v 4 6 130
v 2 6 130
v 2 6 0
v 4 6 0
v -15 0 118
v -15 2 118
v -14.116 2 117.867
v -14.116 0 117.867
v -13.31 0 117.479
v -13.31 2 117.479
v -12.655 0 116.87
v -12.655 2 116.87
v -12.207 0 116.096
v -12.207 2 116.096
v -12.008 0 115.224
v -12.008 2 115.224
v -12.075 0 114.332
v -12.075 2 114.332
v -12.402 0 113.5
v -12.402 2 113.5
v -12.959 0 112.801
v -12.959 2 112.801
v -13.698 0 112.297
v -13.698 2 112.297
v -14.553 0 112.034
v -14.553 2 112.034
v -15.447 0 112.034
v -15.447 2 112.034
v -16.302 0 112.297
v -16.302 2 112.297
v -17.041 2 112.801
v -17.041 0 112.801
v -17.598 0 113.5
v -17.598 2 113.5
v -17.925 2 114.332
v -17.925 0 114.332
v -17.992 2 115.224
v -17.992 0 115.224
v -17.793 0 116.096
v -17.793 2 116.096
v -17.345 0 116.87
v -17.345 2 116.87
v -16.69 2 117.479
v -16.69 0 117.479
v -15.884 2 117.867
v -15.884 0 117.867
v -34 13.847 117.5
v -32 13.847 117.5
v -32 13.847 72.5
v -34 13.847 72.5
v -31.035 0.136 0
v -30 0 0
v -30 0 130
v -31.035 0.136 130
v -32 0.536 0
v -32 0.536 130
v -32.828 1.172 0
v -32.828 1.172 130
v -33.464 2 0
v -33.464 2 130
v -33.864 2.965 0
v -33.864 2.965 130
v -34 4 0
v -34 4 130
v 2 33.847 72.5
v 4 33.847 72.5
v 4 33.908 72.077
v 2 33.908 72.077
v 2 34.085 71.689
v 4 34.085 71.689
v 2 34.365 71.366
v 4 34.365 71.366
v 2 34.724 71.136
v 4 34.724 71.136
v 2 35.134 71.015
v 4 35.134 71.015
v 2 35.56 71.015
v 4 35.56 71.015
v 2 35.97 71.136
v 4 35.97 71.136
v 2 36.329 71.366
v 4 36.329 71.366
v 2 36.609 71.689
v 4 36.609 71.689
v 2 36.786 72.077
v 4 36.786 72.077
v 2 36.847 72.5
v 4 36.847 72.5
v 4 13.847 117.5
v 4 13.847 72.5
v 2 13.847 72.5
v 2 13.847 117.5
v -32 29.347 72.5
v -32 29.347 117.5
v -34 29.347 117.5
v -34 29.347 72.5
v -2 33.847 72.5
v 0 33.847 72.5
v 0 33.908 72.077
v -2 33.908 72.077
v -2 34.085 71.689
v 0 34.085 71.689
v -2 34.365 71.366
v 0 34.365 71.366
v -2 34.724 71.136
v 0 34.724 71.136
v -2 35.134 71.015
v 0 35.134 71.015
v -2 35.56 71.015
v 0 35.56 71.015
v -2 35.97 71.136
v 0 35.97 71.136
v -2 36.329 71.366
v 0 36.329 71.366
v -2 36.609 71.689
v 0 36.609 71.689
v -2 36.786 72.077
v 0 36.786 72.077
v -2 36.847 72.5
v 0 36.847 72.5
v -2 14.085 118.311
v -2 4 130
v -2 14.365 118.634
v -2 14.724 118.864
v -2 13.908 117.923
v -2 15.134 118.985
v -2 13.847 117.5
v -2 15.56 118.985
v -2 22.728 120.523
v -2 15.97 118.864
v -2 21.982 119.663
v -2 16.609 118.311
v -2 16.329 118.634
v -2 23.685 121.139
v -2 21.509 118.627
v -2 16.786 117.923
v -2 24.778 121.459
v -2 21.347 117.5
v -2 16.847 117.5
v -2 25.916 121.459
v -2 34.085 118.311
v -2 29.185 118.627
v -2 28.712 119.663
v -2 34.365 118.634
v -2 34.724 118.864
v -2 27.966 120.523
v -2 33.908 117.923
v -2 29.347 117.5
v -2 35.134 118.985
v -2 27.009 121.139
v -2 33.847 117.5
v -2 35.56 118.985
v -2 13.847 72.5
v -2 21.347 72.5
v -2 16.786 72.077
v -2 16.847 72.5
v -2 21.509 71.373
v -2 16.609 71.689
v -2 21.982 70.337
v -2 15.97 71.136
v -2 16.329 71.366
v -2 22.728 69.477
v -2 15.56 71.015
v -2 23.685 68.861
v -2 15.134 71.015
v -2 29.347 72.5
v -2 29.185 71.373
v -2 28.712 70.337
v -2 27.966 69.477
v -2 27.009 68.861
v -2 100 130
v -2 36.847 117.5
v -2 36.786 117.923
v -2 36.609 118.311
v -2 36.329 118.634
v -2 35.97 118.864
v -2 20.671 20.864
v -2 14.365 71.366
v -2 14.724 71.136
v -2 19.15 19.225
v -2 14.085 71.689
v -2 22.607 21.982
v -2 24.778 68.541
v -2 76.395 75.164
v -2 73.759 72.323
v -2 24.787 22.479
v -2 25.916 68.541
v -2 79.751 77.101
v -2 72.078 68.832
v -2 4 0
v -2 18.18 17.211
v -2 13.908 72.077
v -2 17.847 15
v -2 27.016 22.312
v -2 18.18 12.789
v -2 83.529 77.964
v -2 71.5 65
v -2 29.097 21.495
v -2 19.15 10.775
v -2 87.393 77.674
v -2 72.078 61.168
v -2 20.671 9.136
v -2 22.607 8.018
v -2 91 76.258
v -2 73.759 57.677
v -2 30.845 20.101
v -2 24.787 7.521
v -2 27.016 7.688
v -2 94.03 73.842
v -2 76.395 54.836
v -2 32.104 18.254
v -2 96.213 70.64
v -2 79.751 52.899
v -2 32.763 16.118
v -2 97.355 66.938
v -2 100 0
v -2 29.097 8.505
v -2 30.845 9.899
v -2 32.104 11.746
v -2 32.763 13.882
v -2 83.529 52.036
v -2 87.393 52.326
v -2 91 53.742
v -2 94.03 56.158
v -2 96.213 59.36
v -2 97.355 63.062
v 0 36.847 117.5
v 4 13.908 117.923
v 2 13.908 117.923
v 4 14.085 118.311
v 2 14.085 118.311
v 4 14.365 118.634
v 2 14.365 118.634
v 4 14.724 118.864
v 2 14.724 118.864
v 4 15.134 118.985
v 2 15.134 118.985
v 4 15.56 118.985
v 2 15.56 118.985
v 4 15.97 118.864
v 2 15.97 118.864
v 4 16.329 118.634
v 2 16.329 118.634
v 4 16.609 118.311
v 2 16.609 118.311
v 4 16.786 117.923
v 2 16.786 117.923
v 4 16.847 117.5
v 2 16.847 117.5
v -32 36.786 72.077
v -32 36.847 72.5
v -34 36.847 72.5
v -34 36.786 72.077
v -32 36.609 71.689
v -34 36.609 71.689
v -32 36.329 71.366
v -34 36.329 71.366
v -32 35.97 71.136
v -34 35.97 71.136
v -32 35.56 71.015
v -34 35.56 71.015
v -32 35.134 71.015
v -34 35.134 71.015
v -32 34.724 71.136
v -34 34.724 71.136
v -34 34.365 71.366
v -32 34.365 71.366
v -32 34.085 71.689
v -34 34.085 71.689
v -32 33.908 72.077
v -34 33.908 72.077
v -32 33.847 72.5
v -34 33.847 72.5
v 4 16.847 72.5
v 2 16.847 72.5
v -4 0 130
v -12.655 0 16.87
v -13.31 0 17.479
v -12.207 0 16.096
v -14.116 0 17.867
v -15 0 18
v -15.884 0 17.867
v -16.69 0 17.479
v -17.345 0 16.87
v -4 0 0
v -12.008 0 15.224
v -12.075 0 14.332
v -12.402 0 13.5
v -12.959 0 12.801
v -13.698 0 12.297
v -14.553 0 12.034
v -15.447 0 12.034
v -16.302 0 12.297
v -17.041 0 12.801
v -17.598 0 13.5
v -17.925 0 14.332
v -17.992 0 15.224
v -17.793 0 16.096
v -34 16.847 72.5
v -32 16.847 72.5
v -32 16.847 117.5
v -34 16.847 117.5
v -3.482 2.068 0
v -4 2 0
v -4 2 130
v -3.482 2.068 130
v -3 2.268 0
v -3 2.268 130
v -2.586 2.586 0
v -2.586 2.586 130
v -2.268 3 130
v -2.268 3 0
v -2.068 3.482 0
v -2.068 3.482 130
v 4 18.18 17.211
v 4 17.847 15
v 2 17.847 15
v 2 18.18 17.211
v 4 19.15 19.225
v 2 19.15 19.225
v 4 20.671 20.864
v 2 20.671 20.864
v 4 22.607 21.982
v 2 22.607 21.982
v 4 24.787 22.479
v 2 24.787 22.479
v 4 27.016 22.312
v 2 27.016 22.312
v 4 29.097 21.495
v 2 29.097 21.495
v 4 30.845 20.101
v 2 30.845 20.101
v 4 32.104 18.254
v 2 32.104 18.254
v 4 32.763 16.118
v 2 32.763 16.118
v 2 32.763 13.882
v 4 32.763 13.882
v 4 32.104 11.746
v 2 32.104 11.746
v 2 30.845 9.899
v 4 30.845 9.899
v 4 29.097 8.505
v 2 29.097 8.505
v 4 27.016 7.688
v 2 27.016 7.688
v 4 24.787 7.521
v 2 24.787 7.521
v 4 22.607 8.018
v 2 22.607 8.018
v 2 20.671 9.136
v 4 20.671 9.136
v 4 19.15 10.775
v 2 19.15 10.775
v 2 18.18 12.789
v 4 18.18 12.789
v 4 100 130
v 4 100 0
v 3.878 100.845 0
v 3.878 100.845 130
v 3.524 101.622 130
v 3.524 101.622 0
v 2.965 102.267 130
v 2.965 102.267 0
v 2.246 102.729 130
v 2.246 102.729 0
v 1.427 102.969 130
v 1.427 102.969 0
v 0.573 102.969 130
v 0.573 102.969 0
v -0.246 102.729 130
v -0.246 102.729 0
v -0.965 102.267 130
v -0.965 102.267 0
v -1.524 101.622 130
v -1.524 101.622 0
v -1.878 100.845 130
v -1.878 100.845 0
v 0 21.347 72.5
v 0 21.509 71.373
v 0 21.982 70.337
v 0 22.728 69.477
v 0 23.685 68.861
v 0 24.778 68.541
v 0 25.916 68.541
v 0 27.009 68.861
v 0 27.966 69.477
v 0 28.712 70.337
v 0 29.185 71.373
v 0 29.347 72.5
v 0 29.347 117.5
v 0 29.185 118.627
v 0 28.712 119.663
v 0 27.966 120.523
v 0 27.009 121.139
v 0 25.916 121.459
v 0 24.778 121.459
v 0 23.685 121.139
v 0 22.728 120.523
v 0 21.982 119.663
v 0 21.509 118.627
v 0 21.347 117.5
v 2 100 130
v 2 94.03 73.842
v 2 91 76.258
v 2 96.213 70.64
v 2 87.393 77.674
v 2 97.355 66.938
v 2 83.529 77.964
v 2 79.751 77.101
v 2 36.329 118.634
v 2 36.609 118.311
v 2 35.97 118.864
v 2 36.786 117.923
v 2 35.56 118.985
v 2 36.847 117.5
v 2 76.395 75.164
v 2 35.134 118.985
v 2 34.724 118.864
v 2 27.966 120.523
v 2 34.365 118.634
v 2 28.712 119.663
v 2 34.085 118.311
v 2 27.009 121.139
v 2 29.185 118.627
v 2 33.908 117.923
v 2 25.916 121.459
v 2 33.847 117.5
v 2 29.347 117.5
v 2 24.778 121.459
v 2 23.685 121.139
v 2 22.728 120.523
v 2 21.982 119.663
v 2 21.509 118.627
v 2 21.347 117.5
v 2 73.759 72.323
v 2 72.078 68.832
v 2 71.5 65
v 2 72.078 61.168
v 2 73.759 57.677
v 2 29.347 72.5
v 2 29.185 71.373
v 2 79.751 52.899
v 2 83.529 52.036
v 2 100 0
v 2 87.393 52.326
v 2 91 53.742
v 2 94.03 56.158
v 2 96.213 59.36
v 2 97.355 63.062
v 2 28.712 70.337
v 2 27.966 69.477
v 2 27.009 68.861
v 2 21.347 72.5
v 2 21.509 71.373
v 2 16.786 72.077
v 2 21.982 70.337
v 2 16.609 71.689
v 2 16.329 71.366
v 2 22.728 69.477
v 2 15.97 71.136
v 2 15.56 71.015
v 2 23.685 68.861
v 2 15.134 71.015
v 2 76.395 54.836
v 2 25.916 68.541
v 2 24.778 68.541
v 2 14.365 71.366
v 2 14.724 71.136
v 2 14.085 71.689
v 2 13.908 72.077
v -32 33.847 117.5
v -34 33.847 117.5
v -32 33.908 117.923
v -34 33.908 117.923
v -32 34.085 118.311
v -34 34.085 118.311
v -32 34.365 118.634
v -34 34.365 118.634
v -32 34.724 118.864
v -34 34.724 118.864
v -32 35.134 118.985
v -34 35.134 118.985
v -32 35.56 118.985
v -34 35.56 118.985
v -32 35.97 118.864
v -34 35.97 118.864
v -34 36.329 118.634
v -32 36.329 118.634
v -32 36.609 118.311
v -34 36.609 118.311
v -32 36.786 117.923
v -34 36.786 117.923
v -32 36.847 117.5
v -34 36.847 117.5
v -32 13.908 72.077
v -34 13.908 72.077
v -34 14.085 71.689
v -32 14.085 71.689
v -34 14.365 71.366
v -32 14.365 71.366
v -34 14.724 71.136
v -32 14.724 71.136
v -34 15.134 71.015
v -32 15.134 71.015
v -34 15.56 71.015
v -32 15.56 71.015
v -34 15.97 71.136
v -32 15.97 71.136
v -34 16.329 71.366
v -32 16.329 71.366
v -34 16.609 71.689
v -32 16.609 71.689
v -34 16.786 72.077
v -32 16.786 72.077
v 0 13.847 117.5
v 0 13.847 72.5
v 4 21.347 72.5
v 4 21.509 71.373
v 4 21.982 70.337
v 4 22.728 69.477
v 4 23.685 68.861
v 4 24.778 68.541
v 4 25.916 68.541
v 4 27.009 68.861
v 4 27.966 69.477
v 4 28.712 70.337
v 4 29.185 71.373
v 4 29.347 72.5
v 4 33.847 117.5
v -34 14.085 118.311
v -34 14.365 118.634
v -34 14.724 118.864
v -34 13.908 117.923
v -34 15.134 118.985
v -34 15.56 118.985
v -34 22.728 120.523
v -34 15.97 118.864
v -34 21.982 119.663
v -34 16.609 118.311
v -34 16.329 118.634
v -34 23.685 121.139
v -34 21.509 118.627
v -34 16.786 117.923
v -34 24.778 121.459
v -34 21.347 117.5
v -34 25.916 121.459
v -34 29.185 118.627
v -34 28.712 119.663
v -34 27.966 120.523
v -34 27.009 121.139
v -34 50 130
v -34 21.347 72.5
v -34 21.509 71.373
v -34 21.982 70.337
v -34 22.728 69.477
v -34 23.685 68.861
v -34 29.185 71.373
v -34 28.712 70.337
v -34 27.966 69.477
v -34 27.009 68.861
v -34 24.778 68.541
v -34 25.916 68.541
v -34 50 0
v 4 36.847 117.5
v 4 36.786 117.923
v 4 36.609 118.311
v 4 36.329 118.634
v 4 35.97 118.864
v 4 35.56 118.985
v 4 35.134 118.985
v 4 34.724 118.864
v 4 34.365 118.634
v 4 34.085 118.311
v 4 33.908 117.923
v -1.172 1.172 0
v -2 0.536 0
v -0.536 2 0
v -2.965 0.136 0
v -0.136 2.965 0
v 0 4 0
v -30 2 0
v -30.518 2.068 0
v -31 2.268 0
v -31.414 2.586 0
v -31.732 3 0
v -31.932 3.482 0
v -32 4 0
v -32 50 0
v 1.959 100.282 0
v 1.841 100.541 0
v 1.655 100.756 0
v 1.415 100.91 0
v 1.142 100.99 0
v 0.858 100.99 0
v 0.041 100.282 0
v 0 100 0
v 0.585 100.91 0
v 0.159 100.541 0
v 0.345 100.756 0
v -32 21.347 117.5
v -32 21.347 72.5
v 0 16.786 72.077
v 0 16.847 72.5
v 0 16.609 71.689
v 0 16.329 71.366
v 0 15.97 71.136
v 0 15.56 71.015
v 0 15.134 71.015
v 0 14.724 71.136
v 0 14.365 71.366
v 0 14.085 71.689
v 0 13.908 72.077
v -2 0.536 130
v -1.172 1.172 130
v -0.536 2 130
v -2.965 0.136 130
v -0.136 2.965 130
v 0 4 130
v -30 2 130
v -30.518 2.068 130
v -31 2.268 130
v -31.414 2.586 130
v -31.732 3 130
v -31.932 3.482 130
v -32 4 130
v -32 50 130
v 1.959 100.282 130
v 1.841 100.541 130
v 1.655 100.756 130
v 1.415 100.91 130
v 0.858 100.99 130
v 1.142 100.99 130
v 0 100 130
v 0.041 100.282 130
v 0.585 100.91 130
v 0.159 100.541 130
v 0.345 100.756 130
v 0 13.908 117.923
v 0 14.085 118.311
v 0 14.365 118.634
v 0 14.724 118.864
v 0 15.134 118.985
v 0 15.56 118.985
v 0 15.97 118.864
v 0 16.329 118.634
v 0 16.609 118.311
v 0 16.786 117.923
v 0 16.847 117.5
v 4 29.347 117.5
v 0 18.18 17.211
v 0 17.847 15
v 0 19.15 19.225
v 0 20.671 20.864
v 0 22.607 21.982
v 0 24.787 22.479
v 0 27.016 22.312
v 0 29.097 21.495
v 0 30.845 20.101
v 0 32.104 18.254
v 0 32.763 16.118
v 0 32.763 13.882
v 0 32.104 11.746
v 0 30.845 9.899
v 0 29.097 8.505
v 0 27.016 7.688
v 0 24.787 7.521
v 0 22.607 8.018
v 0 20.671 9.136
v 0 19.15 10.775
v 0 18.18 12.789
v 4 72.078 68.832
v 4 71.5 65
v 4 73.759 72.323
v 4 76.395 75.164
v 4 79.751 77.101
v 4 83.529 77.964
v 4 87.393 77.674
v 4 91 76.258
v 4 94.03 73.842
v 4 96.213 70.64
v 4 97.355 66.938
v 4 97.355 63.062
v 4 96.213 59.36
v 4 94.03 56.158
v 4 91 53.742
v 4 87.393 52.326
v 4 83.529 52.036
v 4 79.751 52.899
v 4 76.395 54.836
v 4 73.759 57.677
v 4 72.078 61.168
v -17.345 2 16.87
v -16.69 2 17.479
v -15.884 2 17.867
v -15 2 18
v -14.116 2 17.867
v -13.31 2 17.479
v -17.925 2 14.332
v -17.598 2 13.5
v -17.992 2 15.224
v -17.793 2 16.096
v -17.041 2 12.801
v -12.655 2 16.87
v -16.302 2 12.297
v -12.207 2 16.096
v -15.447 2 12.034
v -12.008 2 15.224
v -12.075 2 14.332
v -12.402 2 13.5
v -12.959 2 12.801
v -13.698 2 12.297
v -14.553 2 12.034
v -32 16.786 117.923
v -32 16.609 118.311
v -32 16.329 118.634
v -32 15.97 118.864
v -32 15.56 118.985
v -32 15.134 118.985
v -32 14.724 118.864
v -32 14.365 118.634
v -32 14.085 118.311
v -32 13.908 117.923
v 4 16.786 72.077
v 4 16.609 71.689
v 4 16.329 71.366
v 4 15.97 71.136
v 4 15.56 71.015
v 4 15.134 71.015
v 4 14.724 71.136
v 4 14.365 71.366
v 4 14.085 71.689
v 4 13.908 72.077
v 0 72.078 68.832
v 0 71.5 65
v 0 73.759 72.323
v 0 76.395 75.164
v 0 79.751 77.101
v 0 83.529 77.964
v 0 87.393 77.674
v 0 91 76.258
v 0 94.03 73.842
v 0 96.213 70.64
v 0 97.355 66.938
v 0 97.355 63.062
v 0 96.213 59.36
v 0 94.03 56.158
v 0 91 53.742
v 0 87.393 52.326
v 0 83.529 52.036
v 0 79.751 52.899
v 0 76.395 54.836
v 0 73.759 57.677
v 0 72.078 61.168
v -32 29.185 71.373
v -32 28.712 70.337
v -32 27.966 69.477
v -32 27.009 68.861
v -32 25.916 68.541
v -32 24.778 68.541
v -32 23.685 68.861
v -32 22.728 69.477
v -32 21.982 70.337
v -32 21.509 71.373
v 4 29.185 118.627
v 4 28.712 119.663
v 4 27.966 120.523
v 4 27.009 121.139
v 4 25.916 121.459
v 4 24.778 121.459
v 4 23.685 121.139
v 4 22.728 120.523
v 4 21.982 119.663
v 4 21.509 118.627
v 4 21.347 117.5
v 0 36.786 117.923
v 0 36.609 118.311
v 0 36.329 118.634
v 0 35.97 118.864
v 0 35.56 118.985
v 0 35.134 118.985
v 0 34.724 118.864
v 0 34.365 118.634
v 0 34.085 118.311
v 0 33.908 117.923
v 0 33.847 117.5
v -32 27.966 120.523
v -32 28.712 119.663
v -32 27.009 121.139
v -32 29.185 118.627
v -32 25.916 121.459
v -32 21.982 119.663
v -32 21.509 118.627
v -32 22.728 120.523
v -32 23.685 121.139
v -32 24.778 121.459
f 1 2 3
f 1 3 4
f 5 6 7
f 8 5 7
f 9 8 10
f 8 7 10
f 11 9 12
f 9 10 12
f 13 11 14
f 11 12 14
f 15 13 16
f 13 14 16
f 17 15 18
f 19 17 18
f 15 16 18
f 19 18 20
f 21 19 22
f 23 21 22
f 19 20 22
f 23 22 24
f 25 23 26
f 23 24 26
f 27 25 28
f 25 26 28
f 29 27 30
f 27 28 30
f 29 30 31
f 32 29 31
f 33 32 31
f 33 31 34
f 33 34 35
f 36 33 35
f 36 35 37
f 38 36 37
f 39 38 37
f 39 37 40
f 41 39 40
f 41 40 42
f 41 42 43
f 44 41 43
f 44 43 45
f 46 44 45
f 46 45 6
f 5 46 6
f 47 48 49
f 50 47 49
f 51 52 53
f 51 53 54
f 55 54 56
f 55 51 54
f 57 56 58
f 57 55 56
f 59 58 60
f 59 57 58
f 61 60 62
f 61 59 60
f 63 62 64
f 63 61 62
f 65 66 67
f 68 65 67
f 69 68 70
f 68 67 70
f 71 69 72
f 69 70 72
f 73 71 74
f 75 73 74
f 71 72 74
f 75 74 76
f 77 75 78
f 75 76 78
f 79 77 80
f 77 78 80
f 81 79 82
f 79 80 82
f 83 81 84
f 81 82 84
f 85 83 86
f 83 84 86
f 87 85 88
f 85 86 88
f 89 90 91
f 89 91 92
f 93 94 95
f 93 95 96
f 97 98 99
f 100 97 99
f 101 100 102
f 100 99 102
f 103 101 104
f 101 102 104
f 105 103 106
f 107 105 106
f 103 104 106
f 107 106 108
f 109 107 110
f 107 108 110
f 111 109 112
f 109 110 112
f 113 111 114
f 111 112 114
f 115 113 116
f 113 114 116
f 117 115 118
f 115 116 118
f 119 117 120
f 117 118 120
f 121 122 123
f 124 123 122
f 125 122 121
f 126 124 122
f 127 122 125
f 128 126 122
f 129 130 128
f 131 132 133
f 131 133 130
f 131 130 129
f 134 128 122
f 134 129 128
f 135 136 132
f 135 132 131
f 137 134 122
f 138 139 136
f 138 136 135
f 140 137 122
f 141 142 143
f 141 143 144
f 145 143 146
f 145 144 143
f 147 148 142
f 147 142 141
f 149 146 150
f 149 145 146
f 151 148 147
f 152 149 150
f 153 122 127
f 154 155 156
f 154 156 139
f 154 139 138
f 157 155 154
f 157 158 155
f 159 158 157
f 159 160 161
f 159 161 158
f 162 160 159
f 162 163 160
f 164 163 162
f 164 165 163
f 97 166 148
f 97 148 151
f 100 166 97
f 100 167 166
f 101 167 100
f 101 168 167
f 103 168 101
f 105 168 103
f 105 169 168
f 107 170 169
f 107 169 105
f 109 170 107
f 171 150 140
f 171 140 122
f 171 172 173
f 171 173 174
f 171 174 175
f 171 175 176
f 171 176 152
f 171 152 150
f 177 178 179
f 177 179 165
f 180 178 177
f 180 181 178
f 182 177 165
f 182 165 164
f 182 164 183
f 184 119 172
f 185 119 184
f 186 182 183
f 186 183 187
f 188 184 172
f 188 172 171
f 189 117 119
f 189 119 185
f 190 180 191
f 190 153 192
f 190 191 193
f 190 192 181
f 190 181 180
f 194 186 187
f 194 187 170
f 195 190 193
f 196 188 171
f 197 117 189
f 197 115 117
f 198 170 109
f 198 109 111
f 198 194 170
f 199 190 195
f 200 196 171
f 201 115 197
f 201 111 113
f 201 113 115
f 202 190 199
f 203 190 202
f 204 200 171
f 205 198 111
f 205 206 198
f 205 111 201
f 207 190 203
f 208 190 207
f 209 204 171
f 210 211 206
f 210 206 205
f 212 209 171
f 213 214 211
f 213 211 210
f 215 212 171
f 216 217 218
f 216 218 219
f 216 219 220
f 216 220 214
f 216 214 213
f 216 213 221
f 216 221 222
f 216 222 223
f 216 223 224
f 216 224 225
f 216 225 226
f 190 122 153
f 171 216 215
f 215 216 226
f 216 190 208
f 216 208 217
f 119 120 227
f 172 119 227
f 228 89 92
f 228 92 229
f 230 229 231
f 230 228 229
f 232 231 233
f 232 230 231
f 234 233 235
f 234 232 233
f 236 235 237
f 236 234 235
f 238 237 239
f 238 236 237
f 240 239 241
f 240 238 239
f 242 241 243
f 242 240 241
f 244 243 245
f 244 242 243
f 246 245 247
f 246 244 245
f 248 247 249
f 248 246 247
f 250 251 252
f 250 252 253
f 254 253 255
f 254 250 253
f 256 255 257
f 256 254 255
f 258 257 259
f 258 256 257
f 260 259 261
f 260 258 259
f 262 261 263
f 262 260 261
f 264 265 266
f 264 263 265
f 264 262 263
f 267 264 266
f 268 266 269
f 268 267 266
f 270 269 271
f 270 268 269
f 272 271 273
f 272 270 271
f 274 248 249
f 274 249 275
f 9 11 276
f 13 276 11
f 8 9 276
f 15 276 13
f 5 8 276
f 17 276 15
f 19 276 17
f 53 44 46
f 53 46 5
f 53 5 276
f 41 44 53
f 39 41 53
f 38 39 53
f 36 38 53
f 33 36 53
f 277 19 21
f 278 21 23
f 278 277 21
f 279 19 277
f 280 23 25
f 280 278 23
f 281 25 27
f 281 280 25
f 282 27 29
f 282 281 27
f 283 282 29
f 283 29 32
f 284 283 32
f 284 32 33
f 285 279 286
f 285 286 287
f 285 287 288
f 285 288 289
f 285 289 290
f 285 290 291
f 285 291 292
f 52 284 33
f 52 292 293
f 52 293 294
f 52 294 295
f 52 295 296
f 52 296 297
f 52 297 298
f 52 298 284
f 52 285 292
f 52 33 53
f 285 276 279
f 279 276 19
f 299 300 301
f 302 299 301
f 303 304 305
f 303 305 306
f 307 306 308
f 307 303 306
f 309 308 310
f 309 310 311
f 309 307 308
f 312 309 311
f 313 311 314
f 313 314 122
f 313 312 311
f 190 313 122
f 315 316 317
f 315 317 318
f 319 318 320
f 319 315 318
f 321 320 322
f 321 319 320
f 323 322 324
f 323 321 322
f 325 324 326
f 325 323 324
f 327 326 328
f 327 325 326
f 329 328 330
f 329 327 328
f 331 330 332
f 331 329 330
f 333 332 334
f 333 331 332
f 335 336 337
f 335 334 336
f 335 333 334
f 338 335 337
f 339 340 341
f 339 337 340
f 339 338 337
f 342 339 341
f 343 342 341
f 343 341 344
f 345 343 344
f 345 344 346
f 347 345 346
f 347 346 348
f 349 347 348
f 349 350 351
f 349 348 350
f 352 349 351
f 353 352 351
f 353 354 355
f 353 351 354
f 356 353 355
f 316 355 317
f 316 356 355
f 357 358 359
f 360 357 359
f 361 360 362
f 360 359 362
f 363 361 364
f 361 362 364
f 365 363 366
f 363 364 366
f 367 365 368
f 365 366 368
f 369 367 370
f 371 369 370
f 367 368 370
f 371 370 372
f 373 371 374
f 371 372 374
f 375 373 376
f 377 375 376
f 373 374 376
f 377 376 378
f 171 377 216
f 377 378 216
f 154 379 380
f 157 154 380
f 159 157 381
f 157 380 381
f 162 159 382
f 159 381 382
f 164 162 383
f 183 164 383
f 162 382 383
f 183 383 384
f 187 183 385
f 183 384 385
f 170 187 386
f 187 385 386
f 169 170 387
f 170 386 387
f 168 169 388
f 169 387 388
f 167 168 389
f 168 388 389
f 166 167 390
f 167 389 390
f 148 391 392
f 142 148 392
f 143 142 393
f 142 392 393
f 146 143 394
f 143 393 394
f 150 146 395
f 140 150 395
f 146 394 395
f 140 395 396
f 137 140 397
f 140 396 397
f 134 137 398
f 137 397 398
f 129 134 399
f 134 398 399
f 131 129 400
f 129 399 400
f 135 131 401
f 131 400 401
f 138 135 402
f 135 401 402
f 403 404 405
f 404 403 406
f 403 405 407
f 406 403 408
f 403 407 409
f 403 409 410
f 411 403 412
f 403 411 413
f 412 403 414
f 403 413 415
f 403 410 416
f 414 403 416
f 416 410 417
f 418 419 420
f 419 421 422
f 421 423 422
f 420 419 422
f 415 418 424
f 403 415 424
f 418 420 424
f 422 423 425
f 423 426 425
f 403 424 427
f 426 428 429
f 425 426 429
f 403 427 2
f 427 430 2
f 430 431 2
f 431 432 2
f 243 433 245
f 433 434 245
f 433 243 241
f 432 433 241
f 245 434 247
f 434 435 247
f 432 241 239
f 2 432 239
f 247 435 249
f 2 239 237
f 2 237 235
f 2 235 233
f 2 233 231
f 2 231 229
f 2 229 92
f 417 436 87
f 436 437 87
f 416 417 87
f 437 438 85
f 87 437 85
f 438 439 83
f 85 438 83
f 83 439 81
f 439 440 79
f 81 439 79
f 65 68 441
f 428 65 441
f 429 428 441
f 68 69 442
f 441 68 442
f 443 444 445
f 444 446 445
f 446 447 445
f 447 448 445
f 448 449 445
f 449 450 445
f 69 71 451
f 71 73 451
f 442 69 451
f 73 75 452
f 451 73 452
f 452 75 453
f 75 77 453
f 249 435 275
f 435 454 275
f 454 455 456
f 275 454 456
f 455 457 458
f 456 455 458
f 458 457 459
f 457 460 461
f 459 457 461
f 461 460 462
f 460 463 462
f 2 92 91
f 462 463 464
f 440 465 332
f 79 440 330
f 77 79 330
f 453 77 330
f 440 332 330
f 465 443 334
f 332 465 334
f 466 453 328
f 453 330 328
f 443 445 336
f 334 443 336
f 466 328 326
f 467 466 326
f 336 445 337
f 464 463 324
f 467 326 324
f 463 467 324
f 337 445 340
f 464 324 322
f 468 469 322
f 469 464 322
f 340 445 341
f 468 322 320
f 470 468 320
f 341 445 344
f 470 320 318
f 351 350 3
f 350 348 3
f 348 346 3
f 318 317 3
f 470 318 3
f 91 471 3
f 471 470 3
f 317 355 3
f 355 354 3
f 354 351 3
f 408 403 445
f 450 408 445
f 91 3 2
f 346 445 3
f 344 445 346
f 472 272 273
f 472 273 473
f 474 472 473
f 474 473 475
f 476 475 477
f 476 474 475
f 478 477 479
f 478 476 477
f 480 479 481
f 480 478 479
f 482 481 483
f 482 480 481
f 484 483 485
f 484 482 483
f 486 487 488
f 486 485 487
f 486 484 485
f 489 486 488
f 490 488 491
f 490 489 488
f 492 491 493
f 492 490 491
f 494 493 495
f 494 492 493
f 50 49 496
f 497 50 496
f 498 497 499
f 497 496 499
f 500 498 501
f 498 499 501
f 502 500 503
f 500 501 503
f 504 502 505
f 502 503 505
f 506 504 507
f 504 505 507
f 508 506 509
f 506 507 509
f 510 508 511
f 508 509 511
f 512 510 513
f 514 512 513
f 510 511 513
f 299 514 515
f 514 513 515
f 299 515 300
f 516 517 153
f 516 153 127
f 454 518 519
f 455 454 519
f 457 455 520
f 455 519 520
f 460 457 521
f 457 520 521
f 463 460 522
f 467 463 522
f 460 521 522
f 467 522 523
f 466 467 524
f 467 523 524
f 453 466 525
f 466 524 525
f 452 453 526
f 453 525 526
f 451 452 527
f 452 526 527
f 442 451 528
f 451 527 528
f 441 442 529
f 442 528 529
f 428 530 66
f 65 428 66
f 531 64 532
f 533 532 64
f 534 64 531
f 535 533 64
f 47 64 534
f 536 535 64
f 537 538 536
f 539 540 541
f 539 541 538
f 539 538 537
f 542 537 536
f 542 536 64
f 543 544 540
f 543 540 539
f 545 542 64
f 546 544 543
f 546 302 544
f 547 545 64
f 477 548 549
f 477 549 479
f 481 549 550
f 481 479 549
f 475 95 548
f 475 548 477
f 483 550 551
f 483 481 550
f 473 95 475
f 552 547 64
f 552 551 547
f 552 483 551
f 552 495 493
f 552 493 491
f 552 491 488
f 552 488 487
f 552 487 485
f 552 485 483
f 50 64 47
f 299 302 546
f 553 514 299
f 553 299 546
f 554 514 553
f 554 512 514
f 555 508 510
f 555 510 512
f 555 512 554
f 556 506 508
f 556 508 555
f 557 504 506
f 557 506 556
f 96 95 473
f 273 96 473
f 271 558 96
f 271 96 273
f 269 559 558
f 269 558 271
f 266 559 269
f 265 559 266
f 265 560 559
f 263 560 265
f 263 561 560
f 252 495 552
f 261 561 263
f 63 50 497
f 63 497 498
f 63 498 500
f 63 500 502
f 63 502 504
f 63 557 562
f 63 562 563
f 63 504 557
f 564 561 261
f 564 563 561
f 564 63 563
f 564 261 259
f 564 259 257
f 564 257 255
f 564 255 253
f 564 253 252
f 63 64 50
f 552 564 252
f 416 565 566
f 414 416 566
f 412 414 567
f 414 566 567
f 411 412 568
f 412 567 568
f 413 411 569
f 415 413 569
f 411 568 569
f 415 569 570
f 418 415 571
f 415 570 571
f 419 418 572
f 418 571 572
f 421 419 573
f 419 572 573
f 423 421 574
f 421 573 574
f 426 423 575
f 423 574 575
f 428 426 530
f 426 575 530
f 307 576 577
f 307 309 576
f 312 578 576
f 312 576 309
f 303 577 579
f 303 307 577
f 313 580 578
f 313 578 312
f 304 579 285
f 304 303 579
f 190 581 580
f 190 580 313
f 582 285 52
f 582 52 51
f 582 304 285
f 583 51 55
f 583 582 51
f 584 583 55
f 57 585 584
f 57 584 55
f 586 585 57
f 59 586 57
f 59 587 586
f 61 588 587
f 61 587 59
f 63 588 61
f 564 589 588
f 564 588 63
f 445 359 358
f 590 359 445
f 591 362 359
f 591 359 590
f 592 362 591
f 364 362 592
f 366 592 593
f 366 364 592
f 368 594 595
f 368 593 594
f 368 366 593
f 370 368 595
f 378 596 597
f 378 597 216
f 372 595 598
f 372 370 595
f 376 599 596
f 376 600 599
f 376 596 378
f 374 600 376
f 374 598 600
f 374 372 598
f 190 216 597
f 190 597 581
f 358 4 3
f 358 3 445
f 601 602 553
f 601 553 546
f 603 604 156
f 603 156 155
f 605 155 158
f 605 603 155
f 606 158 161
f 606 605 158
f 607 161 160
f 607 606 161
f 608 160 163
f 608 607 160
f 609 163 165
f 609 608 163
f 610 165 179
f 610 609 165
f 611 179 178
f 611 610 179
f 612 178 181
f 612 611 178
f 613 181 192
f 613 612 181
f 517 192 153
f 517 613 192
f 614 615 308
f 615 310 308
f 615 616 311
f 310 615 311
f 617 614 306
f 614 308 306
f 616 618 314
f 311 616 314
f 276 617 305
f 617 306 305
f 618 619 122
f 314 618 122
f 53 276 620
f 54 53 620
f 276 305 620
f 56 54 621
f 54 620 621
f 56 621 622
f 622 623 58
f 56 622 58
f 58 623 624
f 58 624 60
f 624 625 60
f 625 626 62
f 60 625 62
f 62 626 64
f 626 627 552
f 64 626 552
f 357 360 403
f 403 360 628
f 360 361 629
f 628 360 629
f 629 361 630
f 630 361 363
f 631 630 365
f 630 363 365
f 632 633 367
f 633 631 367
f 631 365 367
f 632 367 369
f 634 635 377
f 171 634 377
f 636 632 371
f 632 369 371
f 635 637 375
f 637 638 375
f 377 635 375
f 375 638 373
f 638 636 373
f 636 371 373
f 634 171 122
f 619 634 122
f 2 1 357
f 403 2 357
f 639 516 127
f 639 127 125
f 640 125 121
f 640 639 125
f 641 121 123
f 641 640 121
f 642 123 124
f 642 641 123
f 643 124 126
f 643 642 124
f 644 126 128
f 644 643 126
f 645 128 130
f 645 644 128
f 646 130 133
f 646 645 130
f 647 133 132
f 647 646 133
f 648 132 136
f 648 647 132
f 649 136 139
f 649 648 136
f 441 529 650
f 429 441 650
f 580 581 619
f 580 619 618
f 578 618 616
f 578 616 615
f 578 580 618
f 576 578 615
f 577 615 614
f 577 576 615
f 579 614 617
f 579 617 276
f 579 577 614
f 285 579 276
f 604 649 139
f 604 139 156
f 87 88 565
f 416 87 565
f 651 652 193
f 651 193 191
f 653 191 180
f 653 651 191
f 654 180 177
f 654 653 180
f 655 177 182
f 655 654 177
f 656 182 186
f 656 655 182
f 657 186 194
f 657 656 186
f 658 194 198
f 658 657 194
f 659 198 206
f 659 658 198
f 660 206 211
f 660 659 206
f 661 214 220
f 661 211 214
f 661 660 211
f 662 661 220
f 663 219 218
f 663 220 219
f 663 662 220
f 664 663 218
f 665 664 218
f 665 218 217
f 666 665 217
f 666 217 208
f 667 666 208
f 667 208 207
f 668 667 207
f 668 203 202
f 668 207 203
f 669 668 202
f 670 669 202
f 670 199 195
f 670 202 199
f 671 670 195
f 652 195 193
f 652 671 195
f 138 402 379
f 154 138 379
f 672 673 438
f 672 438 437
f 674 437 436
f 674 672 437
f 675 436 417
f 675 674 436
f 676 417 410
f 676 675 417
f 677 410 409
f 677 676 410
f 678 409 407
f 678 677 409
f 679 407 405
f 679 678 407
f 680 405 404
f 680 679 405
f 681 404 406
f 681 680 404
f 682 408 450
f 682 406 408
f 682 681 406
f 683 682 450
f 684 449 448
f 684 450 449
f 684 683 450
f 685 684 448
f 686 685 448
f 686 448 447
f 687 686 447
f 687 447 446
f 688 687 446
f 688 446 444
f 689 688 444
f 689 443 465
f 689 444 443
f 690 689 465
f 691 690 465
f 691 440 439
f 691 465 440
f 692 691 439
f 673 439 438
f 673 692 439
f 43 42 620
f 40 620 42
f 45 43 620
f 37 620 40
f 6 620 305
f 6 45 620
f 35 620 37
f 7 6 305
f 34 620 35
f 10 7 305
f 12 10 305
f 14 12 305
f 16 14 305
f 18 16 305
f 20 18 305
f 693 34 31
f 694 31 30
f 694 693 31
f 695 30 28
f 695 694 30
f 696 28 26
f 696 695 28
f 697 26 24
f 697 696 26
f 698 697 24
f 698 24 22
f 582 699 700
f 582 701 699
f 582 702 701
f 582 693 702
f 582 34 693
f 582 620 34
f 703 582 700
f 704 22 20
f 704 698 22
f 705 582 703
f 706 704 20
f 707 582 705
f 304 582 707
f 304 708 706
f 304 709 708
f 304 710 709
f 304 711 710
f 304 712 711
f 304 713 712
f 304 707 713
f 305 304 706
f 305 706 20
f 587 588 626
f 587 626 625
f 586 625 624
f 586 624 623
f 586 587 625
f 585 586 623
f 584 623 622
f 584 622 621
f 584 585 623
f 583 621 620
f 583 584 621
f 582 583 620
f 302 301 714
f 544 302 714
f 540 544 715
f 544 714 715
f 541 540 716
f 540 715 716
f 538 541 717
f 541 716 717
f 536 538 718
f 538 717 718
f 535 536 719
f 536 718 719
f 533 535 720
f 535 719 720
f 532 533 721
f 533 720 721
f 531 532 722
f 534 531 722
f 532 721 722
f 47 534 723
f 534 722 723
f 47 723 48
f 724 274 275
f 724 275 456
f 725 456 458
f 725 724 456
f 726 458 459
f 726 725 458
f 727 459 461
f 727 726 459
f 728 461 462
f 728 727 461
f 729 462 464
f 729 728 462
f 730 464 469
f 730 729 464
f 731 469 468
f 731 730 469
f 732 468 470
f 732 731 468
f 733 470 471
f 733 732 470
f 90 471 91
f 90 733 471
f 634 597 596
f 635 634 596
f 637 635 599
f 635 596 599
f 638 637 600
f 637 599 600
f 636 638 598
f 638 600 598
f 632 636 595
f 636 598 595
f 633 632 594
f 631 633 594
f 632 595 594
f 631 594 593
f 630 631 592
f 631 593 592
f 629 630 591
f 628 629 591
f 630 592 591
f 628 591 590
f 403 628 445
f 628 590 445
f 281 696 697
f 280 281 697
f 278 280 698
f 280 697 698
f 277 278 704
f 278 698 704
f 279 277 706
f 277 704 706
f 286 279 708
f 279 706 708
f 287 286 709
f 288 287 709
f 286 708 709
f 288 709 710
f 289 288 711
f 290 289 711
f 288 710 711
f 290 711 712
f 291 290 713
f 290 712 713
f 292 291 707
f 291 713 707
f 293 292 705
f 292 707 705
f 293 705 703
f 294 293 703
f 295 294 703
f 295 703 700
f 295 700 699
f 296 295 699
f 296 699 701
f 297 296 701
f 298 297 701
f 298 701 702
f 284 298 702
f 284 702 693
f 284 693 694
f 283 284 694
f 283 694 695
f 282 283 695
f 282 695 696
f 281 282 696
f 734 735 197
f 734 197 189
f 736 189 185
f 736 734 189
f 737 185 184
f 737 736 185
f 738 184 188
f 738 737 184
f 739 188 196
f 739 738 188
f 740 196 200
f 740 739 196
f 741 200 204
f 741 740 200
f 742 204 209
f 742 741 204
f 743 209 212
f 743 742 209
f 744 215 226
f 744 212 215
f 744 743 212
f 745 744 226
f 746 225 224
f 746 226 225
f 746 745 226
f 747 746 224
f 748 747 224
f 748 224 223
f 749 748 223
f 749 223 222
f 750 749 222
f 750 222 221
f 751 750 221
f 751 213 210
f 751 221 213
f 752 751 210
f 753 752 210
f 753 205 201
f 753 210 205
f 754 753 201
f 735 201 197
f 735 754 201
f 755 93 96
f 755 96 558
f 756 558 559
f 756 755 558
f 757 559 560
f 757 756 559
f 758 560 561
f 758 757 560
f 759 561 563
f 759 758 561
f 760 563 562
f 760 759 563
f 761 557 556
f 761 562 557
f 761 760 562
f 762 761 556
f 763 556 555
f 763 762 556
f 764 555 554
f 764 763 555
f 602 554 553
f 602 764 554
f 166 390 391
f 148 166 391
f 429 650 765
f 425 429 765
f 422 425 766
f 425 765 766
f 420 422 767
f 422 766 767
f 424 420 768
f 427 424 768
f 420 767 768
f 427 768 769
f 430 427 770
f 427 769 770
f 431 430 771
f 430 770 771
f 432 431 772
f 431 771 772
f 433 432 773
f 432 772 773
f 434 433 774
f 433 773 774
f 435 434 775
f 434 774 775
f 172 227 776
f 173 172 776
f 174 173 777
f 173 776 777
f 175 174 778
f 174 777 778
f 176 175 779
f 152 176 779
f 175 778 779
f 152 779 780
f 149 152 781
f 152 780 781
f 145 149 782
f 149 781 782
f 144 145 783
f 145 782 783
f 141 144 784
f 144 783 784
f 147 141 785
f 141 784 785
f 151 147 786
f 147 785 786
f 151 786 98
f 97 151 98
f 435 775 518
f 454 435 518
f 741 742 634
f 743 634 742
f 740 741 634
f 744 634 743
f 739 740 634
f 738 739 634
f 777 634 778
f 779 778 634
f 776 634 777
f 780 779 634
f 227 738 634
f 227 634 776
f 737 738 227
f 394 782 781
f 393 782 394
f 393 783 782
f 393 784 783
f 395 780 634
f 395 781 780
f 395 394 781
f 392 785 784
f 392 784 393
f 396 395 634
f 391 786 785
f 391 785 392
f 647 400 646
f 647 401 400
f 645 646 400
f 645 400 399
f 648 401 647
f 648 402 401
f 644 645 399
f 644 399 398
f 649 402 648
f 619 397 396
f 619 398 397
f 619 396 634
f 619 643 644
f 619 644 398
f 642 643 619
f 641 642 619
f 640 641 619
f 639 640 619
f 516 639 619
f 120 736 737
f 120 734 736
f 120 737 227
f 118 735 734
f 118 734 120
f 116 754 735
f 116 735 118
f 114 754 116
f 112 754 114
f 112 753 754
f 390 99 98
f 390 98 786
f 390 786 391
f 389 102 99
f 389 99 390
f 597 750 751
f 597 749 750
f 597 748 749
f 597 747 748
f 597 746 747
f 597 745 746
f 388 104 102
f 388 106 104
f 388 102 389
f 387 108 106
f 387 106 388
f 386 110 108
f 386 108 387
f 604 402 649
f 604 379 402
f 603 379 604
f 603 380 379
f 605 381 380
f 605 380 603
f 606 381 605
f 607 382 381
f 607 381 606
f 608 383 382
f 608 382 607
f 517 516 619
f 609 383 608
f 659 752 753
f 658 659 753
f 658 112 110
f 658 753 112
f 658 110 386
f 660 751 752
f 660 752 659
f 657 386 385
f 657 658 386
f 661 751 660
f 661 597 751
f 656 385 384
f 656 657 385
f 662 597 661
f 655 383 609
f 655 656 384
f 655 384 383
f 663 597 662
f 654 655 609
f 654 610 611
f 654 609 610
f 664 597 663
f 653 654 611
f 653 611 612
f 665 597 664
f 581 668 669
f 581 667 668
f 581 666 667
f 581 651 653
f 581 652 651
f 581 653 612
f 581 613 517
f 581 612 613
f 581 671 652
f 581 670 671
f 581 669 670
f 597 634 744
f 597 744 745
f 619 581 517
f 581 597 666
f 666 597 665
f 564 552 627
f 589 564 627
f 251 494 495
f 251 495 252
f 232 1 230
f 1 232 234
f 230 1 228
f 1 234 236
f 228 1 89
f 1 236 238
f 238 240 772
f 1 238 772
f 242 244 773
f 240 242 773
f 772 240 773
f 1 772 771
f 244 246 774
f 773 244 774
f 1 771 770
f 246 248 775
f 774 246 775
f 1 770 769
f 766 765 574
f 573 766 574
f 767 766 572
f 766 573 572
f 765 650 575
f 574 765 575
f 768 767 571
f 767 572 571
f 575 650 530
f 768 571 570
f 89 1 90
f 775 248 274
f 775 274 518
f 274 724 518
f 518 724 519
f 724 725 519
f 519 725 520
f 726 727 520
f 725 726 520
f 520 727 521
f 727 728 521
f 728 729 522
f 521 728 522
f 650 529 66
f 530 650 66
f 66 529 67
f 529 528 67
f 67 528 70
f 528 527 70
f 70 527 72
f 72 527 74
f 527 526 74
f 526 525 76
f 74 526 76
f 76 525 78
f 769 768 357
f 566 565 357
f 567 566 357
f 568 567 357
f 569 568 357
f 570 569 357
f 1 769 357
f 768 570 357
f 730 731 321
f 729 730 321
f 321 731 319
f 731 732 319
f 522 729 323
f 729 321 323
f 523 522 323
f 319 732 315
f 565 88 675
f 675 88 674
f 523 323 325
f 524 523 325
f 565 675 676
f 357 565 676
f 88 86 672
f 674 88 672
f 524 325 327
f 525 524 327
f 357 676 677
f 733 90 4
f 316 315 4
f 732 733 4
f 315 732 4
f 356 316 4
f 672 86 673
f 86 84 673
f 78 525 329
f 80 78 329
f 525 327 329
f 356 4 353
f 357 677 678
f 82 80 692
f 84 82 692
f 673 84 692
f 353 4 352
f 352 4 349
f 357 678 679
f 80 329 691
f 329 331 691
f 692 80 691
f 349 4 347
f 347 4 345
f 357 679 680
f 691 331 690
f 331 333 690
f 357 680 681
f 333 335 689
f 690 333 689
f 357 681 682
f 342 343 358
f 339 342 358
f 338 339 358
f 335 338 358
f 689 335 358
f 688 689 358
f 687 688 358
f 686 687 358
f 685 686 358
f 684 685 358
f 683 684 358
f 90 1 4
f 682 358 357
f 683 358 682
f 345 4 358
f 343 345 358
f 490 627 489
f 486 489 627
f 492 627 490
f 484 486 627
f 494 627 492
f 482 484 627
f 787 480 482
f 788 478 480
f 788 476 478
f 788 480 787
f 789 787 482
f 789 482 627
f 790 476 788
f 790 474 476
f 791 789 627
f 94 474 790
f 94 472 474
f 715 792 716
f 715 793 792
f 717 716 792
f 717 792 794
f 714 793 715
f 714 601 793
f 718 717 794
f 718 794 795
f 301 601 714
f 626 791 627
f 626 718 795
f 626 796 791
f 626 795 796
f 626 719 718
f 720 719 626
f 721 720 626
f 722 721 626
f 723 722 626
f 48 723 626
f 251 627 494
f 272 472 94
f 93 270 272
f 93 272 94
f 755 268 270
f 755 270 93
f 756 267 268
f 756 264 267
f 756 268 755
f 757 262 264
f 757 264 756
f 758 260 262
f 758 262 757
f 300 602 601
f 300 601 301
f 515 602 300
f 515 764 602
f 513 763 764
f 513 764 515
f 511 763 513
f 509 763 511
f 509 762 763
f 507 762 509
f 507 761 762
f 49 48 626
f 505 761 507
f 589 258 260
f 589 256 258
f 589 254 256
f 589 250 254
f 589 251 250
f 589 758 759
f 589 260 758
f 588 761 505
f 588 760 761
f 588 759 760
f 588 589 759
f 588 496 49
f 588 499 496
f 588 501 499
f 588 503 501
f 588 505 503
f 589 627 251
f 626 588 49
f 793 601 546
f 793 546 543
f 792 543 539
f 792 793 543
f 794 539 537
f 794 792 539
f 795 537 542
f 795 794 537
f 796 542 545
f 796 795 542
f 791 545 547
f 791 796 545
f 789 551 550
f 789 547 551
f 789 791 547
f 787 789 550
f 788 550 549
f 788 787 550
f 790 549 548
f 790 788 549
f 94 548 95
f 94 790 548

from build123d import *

# Parameters (mm, degrees)
BASE_FLANGE1_DEPTH      = 130
SKETCH6_R               = 3
CUT_EXTRUDE1_DEPTH      = 10
HEM1_DEPTH              = 130
CUT_EXTRUDE2_DEPTH      = 169.205231785
CUT_EXTRUDE2_DEPTH_BACK = 169.205231785
SKETCH7_R               = 13
SKETCH7_R_2             = 7.5
EDGE_FLANGE1_DEPTH      = 130
CUT_EXTRUDE3_DEPTH      = 47


# Read off the part's stored shape, not the designer's step: Hem1
# Sheet-metal steps are written as plain solids
with BuildPart() as part:
    # Sketch1 → Base-Flange1 (new body)
    with BuildSketch(Plane.XY):
        with BuildLine():
            Line((0, 100), (0, 4))
            ThreePointArc((0, 4), (-1.171572875, 1.171572875), (-4, 0))
            Line((-4, 0), (-30, 0))
            Line((-30, 0), (-30, 2))
            Line((-30, 2), (-4, 2))
            ThreePointArc((-4, 2), (-2.585786438, 2.585786438), (-2, 4))
            Line((-2, 4), (-2, 100))
            Line((-2, 100), (0, 100))
        make_face()
    extrude(amount=BASE_FLANGE1_DEPTH)

    # Sketch6 → Cut-Extrude1 (cut)
    with BuildSketch(Plane(origin=(0, 2, 0), x_dir=(1, 0, 0), z_dir=(0, 1, 0))):
        with Locations(Location((-15, -15, 0), (0, 0, 270))):
            Circle(SKETCH6_R)
        with Locations(Location((-15, -115, 0), (0, 0, 270))):
            Circle(SKETCH6_R)
    extrude(amount=-CUT_EXTRUDE1_DEPTH, mode=Mode.SUBTRACT)

    # Hem1 outline → Hem1 (add)
    with BuildSketch(Plane.XY):
        with BuildLine():
            Line((2, 6), (4, 6))
            Line((4, 6), (4, 100))
            ThreePointArc((4, 100), (1, 103), (-2, 100))
            Line((-2, 100), (0, 100))
            ThreePointArc((0, 100), (1, 101), (2, 100))
            Line((2, 100), (2, 6))
        make_face()
    extrude(amount=HEM1_DEPTH)

    # Sketch7 → Cut-Extrude2 (cut, two sides: drawn at the far end of the back side and taken through both)
    with BuildSketch(Plane.ZY.offset(2).offset(-CUT_EXTRUDE2_DEPTH_BACK)):
        with Locations(Location((65, 84.5, 0), (0, 0, 270))):
            Circle(SKETCH7_R)
        with Locations(Location((15, 25.347000811, 0), (0, 0, 270))):
            Circle(SKETCH7_R_2)
        with BuildLine():
            Line((72.5, 29.347000811), (117.5, 29.347000811))
            ThreePointArc((117.5, 29.347000811), (121.5, 25.347000811), (117.5, 21.347000811))
            Line((117.5, 21.347000811), (72.5, 21.347000811))
            ThreePointArc((72.5, 21.347000811), (68.5, 25.347000811), (72.5, 29.347000811))
        make_face()
        with BuildLine():
            Line((72.5, 36.847000811), (117.5, 36.847000811))
            ThreePointArc((117.5, 36.847000811), (119, 35.347000811), (117.5, 33.847000811))
            Line((117.5, 33.847000811), (72.5, 33.847000811))
            ThreePointArc((72.5, 33.847000811), (71, 35.347000811), (72.5, 36.847000811))
        make_face()
        with BuildLine():
            Line((72.5, 13.847000811), (117.5, 13.847000811))
            ThreePointArc((117.5, 13.847000811), (119, 15.347000811), (117.5, 16.847000811))
            Line((117.5, 16.847000811), (72.5, 16.847000811))
            ThreePointArc((72.5, 16.847000811), (71, 15.347000811), (72.5, 13.847000811))
        make_face()
    extrude(amount=CUT_EXTRUDE2_DEPTH + CUT_EXTRUDE2_DEPTH_BACK, mode=Mode.SUBTRACT)

    # Edge-Flange1 section (across the edge) → Edge-Flange1 (add)
    with BuildSketch(Plane(origin=(-32, 2, 0), x_dir=(1, 0, 0), z_dir=(0, 0, 1))):
        with BuildLine():
            Line((-2, 2), (-2, 48))
            Line((-2, 48), (0, 48))
            Line((0, 48), (0, 2))
            ThreePointArc((0, 2), (0.585786438, 0.585786438), (2, 0))
            Line((2, 0), (2, -2))
            ThreePointArc((2, -2), (-0.828427125, -0.828427125), (-2, 2))
        make_face()
    extrude(amount=EDGE_FLANGE1_DEPTH)

    # Sketch7<2> → Cut-Extrude3 (cut)
    with BuildSketch(Plane.ZY.offset(2)):
        with BuildLine():
            Line((72.5, 33.847000811), (117.5, 33.847000811))
            ThreePointArc((117.5, 33.847000811), (119, 35.347000811), (117.5, 36.847000811))
            Line((117.5, 36.847000811), (72.5, 36.847000811))
            ThreePointArc((72.5, 36.847000811), (71, 35.347000811), (72.5, 33.847000811))
        make_face()
        with BuildLine():
            Line((72.5, 21.347000811), (117.5, 21.347000811))
            ThreePointArc((117.5, 21.347000811), (121.5, 25.347000811), (117.5, 29.347000811))
            Line((117.5, 29.347000811), (72.5, 29.347000811))
            ThreePointArc((72.5, 29.347000811), (68.5, 25.347000811), (72.5, 21.347000811))
        make_face()
        with BuildLine():
            ThreePointArc((117.5, 16.847000811), (119, 15.347000811), (117.5, 13.847000811))
            Line((117.5, 13.847000811), (72.5, 13.847000811))
            ThreePointArc((72.5, 13.847000811), (71, 15.347000811), (72.5, 16.847000811))
            Line((72.5, 16.847000811), (117.5, 16.847000811))
        make_face()
    extrude(amount=CUT_EXTRUDE3_DEPTH, mode=Mode.SUBTRACT)


solid = part.part
